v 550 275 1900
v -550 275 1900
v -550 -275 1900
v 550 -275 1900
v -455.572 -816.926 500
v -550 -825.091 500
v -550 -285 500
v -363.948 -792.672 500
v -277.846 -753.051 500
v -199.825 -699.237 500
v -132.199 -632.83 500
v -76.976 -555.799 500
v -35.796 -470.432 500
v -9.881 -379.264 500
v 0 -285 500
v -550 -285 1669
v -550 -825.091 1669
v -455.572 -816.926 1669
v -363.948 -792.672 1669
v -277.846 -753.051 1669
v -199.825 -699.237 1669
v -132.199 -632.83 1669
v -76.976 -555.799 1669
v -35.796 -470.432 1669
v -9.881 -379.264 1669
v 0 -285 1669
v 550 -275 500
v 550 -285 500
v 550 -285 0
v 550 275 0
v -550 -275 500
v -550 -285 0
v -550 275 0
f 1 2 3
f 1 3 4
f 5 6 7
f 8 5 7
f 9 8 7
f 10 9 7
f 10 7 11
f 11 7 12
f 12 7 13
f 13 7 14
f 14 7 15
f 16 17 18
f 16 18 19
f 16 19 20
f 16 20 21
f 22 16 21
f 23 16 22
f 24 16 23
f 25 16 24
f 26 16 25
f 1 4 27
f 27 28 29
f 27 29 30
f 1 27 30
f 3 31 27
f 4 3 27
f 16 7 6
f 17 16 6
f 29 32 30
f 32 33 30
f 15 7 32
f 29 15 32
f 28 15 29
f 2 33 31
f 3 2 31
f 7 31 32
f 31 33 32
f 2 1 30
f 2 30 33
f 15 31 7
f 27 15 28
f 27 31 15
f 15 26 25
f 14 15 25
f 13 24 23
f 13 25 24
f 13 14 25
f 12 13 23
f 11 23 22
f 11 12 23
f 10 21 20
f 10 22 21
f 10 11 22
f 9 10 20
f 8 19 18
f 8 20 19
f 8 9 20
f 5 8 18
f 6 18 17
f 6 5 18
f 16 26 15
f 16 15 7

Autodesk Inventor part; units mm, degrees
ref_plane "YZ Plane" through (0, 0, 0) normal (1, 0, 0) x (0, 1, 0)
ref_plane "XZ Plane" through (0, 0, 0) normal (0, 1, 0) x (-1, 0, 0)
ref_plane "XY Plane" through (0, 0, 0) normal (0, 0, 1) x (1, 0, 0)
sketch "Sketch1" plane through (0, 0, 0) normal (0, 0, 1) x (1, 0, 0)
  line L0 (550, 275) -> (-550, 275)
  line L1 (-550, 275) -> (-550, -275)
  line L2 (-550, -275) -> (550, -275)
  line L3 (550, -275) -> (550, 275)
  line L4 (550, 275) -> (-550, -275) construction
  line L5 (-550, 275) -> (550, -275) construction
  point P0 (0, 0)
  dimension "d0" = 1100
  dimension "d1" = 550
extrude "Extrusion1" add sketch "Sketch1" along normal blind 1900
sketch "Sketch2" plane through (-550, -275, 0) normal (0, -1, 0) x (1, 0, 0)
  line L0 (0, 0) -> (1100, 0) projected
  line L1 (1100, 0) -> (1100, 1900) projected
  line L2 (0, 1900) -> (1100, 1900) projected
  line L3 (0, 0) -> (0, 1900) projected
  line L4 (0, 500) -> (1100, 500)
  line L5 (845.0983, 500) -> (550, 1900)
  point P0 (550, 0)
  dimension "d4" = 500
extrude "Extrusion2" add sketch "Sketch2" along normal blind 10 contours L3 L4 L1 L0
sketch "Sketch3" plane through (-550, -275, 500) normal (0, 0, 1) x (1, 0, 0)
  line L0 (0, 0) -> (1100, 0) projected
  line L1 (0, 0) -> (0, -10) projected
  line L2 (1100, -10) -> (0, -10) projected
  line L3 (1100, 0) -> (1100, -10) projected
  circle A0 centre (0, 0) radius 550.0909
  line L4 (0, 0) -> (0, -550.0909)
  point P0 (550, 275)
  point P1 (550, -10)
extrude "Extrusion3" add sketch "Sketch3" along normal blind 1169 contours L2 A0 L4
properties part number "BSH 01 bag"
